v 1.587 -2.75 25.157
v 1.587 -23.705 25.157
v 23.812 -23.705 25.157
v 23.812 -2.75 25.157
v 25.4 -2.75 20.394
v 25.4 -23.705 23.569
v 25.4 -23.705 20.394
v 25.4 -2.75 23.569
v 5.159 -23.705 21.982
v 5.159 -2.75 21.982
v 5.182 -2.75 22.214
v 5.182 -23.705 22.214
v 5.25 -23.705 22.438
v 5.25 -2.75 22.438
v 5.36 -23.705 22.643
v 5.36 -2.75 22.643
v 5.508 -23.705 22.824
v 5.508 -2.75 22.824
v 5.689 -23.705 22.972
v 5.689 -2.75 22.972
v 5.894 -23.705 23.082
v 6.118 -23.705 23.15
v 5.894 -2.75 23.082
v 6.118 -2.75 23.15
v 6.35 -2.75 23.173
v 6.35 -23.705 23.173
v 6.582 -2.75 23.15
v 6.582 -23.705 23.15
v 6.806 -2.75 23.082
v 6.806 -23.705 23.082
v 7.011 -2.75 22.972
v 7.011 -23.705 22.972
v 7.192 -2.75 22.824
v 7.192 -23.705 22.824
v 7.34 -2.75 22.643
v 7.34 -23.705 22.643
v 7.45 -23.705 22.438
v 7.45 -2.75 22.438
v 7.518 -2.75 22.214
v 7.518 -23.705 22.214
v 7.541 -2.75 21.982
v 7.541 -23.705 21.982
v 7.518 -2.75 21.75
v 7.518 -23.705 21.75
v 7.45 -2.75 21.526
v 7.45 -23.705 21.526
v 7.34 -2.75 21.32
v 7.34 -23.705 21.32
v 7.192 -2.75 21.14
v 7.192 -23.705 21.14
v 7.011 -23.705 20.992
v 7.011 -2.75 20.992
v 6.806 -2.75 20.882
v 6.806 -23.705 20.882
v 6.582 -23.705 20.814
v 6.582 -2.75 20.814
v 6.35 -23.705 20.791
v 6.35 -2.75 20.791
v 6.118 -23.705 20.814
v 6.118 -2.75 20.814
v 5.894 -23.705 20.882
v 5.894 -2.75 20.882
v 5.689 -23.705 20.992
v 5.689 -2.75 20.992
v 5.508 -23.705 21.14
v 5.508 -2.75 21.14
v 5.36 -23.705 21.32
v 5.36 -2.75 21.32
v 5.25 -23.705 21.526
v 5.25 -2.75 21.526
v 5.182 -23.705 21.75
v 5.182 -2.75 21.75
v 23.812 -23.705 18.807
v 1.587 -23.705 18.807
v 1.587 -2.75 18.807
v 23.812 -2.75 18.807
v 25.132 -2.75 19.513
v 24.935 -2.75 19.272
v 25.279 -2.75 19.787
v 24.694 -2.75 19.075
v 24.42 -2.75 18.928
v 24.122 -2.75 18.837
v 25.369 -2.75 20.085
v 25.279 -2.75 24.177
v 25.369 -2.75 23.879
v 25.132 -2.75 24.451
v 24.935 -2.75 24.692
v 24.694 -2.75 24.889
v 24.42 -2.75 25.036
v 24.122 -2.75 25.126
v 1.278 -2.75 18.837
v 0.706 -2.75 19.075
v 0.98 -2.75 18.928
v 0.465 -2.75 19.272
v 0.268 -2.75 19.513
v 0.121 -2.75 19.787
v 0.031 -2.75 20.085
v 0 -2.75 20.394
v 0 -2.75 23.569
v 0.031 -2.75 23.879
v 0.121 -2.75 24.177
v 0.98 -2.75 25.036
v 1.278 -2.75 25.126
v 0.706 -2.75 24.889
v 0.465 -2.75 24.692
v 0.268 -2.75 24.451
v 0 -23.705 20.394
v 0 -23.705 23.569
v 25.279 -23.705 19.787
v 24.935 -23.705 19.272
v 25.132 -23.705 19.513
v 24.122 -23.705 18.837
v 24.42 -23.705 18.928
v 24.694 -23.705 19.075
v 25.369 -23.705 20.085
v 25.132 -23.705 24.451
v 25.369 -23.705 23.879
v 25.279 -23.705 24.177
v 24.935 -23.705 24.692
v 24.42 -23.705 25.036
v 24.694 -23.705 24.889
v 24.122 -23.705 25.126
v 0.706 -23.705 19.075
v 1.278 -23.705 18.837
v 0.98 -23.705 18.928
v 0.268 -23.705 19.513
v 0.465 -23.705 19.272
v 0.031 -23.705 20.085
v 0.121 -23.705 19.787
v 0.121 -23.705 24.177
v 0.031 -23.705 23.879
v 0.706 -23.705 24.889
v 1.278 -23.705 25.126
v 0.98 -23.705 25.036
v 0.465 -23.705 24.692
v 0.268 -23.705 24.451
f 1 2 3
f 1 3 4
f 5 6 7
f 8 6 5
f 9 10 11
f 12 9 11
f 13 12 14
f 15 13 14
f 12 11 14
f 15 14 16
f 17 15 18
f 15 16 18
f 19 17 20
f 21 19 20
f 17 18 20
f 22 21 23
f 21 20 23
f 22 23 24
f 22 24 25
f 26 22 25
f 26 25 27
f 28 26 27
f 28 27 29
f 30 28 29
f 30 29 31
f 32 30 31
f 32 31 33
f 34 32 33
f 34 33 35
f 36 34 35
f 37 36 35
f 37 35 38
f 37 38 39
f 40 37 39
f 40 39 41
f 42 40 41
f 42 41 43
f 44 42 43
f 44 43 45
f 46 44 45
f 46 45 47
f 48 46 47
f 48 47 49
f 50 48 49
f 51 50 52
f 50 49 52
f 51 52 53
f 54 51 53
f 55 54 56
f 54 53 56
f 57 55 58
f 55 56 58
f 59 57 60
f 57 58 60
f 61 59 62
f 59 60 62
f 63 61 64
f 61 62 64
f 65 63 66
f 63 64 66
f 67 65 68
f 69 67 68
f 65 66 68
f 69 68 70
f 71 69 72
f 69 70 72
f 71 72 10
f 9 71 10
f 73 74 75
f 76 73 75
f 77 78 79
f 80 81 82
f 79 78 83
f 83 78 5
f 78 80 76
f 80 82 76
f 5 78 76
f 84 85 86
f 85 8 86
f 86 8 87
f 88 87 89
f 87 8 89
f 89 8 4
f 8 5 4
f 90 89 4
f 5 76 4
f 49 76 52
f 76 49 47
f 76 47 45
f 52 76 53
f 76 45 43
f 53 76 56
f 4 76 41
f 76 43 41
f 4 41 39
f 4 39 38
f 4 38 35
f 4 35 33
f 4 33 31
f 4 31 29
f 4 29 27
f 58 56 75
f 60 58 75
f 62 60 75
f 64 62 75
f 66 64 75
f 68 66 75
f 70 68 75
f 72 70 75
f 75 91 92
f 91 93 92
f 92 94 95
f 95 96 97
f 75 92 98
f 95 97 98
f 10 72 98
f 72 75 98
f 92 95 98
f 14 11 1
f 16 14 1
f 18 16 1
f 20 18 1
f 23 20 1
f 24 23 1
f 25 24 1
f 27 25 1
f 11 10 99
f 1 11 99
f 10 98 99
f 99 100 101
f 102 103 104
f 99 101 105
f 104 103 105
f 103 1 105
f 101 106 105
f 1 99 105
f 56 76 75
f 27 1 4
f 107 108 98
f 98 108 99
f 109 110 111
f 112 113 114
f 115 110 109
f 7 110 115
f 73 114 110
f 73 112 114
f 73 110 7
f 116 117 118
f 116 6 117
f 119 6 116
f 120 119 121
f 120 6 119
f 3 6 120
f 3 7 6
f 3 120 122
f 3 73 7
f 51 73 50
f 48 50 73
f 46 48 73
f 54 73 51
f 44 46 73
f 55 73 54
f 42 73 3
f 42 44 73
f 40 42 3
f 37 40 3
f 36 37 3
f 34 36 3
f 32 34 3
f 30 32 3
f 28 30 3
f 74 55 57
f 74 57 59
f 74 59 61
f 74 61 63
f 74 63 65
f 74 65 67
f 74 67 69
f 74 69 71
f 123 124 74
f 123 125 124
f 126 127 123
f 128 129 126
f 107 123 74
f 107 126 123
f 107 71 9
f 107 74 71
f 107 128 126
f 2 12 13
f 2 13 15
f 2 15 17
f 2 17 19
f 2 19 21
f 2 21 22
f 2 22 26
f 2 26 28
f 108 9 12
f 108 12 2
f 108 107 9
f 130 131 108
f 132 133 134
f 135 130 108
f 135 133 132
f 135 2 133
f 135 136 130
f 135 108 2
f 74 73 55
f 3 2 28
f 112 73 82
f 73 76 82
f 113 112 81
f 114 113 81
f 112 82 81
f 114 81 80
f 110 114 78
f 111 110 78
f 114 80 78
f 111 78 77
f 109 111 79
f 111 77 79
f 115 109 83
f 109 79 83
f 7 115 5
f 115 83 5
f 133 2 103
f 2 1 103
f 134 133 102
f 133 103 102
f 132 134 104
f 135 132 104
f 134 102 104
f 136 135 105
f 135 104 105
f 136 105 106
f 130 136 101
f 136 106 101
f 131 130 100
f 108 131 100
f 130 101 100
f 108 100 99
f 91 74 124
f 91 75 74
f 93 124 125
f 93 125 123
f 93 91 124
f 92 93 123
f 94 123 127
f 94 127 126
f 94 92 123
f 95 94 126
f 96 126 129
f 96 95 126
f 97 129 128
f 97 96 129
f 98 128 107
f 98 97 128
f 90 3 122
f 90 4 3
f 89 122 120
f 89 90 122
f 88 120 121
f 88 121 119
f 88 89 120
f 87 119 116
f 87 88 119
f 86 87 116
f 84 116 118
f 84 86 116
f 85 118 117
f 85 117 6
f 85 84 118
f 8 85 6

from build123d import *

# Parameters (mm, degrees)
F0_W     = 20.955
F0_H     = 6.35
F1_DEPTH = 25.4
F2_R     = 1.5875
F3_R     = 1.190625
F4_DEPTH = 25.4


with BuildPart() as f1:
    # F0 (on Right) → F1 (new body)
    with BuildSketch(Plane.YZ):
        with Locations((-13.227284, 21.981973)):
            Rectangle(F0_W, F0_H)
    extrude(amount=F1_DEPTH)

    # F2
    f2_edges = [f1.edges().sort_by_distance(p)[0] for p in [
        (25.4, -13.227284, 25.156973),
        (25.4, -13.227284, 18.806973),
        (0, -13.227284, 18.806973),
        (0, -13.227284, 25.156973),
    ]]
    fillet(f2_edges, radius=F2_R)

    # F3 (on face) → F4 (cut)
    with BuildSketch(Plane(origin=(0, -2.749784, 0), x_dir=(-1, 0, 0), z_dir=(0, 1, 0))):
        with Locations((-6.35, 21.981973)):
            Circle(F3_R)
    extrude(amount=-F4_DEPTH, mode=Mode.SUBTRACT)


solid = f1.part
